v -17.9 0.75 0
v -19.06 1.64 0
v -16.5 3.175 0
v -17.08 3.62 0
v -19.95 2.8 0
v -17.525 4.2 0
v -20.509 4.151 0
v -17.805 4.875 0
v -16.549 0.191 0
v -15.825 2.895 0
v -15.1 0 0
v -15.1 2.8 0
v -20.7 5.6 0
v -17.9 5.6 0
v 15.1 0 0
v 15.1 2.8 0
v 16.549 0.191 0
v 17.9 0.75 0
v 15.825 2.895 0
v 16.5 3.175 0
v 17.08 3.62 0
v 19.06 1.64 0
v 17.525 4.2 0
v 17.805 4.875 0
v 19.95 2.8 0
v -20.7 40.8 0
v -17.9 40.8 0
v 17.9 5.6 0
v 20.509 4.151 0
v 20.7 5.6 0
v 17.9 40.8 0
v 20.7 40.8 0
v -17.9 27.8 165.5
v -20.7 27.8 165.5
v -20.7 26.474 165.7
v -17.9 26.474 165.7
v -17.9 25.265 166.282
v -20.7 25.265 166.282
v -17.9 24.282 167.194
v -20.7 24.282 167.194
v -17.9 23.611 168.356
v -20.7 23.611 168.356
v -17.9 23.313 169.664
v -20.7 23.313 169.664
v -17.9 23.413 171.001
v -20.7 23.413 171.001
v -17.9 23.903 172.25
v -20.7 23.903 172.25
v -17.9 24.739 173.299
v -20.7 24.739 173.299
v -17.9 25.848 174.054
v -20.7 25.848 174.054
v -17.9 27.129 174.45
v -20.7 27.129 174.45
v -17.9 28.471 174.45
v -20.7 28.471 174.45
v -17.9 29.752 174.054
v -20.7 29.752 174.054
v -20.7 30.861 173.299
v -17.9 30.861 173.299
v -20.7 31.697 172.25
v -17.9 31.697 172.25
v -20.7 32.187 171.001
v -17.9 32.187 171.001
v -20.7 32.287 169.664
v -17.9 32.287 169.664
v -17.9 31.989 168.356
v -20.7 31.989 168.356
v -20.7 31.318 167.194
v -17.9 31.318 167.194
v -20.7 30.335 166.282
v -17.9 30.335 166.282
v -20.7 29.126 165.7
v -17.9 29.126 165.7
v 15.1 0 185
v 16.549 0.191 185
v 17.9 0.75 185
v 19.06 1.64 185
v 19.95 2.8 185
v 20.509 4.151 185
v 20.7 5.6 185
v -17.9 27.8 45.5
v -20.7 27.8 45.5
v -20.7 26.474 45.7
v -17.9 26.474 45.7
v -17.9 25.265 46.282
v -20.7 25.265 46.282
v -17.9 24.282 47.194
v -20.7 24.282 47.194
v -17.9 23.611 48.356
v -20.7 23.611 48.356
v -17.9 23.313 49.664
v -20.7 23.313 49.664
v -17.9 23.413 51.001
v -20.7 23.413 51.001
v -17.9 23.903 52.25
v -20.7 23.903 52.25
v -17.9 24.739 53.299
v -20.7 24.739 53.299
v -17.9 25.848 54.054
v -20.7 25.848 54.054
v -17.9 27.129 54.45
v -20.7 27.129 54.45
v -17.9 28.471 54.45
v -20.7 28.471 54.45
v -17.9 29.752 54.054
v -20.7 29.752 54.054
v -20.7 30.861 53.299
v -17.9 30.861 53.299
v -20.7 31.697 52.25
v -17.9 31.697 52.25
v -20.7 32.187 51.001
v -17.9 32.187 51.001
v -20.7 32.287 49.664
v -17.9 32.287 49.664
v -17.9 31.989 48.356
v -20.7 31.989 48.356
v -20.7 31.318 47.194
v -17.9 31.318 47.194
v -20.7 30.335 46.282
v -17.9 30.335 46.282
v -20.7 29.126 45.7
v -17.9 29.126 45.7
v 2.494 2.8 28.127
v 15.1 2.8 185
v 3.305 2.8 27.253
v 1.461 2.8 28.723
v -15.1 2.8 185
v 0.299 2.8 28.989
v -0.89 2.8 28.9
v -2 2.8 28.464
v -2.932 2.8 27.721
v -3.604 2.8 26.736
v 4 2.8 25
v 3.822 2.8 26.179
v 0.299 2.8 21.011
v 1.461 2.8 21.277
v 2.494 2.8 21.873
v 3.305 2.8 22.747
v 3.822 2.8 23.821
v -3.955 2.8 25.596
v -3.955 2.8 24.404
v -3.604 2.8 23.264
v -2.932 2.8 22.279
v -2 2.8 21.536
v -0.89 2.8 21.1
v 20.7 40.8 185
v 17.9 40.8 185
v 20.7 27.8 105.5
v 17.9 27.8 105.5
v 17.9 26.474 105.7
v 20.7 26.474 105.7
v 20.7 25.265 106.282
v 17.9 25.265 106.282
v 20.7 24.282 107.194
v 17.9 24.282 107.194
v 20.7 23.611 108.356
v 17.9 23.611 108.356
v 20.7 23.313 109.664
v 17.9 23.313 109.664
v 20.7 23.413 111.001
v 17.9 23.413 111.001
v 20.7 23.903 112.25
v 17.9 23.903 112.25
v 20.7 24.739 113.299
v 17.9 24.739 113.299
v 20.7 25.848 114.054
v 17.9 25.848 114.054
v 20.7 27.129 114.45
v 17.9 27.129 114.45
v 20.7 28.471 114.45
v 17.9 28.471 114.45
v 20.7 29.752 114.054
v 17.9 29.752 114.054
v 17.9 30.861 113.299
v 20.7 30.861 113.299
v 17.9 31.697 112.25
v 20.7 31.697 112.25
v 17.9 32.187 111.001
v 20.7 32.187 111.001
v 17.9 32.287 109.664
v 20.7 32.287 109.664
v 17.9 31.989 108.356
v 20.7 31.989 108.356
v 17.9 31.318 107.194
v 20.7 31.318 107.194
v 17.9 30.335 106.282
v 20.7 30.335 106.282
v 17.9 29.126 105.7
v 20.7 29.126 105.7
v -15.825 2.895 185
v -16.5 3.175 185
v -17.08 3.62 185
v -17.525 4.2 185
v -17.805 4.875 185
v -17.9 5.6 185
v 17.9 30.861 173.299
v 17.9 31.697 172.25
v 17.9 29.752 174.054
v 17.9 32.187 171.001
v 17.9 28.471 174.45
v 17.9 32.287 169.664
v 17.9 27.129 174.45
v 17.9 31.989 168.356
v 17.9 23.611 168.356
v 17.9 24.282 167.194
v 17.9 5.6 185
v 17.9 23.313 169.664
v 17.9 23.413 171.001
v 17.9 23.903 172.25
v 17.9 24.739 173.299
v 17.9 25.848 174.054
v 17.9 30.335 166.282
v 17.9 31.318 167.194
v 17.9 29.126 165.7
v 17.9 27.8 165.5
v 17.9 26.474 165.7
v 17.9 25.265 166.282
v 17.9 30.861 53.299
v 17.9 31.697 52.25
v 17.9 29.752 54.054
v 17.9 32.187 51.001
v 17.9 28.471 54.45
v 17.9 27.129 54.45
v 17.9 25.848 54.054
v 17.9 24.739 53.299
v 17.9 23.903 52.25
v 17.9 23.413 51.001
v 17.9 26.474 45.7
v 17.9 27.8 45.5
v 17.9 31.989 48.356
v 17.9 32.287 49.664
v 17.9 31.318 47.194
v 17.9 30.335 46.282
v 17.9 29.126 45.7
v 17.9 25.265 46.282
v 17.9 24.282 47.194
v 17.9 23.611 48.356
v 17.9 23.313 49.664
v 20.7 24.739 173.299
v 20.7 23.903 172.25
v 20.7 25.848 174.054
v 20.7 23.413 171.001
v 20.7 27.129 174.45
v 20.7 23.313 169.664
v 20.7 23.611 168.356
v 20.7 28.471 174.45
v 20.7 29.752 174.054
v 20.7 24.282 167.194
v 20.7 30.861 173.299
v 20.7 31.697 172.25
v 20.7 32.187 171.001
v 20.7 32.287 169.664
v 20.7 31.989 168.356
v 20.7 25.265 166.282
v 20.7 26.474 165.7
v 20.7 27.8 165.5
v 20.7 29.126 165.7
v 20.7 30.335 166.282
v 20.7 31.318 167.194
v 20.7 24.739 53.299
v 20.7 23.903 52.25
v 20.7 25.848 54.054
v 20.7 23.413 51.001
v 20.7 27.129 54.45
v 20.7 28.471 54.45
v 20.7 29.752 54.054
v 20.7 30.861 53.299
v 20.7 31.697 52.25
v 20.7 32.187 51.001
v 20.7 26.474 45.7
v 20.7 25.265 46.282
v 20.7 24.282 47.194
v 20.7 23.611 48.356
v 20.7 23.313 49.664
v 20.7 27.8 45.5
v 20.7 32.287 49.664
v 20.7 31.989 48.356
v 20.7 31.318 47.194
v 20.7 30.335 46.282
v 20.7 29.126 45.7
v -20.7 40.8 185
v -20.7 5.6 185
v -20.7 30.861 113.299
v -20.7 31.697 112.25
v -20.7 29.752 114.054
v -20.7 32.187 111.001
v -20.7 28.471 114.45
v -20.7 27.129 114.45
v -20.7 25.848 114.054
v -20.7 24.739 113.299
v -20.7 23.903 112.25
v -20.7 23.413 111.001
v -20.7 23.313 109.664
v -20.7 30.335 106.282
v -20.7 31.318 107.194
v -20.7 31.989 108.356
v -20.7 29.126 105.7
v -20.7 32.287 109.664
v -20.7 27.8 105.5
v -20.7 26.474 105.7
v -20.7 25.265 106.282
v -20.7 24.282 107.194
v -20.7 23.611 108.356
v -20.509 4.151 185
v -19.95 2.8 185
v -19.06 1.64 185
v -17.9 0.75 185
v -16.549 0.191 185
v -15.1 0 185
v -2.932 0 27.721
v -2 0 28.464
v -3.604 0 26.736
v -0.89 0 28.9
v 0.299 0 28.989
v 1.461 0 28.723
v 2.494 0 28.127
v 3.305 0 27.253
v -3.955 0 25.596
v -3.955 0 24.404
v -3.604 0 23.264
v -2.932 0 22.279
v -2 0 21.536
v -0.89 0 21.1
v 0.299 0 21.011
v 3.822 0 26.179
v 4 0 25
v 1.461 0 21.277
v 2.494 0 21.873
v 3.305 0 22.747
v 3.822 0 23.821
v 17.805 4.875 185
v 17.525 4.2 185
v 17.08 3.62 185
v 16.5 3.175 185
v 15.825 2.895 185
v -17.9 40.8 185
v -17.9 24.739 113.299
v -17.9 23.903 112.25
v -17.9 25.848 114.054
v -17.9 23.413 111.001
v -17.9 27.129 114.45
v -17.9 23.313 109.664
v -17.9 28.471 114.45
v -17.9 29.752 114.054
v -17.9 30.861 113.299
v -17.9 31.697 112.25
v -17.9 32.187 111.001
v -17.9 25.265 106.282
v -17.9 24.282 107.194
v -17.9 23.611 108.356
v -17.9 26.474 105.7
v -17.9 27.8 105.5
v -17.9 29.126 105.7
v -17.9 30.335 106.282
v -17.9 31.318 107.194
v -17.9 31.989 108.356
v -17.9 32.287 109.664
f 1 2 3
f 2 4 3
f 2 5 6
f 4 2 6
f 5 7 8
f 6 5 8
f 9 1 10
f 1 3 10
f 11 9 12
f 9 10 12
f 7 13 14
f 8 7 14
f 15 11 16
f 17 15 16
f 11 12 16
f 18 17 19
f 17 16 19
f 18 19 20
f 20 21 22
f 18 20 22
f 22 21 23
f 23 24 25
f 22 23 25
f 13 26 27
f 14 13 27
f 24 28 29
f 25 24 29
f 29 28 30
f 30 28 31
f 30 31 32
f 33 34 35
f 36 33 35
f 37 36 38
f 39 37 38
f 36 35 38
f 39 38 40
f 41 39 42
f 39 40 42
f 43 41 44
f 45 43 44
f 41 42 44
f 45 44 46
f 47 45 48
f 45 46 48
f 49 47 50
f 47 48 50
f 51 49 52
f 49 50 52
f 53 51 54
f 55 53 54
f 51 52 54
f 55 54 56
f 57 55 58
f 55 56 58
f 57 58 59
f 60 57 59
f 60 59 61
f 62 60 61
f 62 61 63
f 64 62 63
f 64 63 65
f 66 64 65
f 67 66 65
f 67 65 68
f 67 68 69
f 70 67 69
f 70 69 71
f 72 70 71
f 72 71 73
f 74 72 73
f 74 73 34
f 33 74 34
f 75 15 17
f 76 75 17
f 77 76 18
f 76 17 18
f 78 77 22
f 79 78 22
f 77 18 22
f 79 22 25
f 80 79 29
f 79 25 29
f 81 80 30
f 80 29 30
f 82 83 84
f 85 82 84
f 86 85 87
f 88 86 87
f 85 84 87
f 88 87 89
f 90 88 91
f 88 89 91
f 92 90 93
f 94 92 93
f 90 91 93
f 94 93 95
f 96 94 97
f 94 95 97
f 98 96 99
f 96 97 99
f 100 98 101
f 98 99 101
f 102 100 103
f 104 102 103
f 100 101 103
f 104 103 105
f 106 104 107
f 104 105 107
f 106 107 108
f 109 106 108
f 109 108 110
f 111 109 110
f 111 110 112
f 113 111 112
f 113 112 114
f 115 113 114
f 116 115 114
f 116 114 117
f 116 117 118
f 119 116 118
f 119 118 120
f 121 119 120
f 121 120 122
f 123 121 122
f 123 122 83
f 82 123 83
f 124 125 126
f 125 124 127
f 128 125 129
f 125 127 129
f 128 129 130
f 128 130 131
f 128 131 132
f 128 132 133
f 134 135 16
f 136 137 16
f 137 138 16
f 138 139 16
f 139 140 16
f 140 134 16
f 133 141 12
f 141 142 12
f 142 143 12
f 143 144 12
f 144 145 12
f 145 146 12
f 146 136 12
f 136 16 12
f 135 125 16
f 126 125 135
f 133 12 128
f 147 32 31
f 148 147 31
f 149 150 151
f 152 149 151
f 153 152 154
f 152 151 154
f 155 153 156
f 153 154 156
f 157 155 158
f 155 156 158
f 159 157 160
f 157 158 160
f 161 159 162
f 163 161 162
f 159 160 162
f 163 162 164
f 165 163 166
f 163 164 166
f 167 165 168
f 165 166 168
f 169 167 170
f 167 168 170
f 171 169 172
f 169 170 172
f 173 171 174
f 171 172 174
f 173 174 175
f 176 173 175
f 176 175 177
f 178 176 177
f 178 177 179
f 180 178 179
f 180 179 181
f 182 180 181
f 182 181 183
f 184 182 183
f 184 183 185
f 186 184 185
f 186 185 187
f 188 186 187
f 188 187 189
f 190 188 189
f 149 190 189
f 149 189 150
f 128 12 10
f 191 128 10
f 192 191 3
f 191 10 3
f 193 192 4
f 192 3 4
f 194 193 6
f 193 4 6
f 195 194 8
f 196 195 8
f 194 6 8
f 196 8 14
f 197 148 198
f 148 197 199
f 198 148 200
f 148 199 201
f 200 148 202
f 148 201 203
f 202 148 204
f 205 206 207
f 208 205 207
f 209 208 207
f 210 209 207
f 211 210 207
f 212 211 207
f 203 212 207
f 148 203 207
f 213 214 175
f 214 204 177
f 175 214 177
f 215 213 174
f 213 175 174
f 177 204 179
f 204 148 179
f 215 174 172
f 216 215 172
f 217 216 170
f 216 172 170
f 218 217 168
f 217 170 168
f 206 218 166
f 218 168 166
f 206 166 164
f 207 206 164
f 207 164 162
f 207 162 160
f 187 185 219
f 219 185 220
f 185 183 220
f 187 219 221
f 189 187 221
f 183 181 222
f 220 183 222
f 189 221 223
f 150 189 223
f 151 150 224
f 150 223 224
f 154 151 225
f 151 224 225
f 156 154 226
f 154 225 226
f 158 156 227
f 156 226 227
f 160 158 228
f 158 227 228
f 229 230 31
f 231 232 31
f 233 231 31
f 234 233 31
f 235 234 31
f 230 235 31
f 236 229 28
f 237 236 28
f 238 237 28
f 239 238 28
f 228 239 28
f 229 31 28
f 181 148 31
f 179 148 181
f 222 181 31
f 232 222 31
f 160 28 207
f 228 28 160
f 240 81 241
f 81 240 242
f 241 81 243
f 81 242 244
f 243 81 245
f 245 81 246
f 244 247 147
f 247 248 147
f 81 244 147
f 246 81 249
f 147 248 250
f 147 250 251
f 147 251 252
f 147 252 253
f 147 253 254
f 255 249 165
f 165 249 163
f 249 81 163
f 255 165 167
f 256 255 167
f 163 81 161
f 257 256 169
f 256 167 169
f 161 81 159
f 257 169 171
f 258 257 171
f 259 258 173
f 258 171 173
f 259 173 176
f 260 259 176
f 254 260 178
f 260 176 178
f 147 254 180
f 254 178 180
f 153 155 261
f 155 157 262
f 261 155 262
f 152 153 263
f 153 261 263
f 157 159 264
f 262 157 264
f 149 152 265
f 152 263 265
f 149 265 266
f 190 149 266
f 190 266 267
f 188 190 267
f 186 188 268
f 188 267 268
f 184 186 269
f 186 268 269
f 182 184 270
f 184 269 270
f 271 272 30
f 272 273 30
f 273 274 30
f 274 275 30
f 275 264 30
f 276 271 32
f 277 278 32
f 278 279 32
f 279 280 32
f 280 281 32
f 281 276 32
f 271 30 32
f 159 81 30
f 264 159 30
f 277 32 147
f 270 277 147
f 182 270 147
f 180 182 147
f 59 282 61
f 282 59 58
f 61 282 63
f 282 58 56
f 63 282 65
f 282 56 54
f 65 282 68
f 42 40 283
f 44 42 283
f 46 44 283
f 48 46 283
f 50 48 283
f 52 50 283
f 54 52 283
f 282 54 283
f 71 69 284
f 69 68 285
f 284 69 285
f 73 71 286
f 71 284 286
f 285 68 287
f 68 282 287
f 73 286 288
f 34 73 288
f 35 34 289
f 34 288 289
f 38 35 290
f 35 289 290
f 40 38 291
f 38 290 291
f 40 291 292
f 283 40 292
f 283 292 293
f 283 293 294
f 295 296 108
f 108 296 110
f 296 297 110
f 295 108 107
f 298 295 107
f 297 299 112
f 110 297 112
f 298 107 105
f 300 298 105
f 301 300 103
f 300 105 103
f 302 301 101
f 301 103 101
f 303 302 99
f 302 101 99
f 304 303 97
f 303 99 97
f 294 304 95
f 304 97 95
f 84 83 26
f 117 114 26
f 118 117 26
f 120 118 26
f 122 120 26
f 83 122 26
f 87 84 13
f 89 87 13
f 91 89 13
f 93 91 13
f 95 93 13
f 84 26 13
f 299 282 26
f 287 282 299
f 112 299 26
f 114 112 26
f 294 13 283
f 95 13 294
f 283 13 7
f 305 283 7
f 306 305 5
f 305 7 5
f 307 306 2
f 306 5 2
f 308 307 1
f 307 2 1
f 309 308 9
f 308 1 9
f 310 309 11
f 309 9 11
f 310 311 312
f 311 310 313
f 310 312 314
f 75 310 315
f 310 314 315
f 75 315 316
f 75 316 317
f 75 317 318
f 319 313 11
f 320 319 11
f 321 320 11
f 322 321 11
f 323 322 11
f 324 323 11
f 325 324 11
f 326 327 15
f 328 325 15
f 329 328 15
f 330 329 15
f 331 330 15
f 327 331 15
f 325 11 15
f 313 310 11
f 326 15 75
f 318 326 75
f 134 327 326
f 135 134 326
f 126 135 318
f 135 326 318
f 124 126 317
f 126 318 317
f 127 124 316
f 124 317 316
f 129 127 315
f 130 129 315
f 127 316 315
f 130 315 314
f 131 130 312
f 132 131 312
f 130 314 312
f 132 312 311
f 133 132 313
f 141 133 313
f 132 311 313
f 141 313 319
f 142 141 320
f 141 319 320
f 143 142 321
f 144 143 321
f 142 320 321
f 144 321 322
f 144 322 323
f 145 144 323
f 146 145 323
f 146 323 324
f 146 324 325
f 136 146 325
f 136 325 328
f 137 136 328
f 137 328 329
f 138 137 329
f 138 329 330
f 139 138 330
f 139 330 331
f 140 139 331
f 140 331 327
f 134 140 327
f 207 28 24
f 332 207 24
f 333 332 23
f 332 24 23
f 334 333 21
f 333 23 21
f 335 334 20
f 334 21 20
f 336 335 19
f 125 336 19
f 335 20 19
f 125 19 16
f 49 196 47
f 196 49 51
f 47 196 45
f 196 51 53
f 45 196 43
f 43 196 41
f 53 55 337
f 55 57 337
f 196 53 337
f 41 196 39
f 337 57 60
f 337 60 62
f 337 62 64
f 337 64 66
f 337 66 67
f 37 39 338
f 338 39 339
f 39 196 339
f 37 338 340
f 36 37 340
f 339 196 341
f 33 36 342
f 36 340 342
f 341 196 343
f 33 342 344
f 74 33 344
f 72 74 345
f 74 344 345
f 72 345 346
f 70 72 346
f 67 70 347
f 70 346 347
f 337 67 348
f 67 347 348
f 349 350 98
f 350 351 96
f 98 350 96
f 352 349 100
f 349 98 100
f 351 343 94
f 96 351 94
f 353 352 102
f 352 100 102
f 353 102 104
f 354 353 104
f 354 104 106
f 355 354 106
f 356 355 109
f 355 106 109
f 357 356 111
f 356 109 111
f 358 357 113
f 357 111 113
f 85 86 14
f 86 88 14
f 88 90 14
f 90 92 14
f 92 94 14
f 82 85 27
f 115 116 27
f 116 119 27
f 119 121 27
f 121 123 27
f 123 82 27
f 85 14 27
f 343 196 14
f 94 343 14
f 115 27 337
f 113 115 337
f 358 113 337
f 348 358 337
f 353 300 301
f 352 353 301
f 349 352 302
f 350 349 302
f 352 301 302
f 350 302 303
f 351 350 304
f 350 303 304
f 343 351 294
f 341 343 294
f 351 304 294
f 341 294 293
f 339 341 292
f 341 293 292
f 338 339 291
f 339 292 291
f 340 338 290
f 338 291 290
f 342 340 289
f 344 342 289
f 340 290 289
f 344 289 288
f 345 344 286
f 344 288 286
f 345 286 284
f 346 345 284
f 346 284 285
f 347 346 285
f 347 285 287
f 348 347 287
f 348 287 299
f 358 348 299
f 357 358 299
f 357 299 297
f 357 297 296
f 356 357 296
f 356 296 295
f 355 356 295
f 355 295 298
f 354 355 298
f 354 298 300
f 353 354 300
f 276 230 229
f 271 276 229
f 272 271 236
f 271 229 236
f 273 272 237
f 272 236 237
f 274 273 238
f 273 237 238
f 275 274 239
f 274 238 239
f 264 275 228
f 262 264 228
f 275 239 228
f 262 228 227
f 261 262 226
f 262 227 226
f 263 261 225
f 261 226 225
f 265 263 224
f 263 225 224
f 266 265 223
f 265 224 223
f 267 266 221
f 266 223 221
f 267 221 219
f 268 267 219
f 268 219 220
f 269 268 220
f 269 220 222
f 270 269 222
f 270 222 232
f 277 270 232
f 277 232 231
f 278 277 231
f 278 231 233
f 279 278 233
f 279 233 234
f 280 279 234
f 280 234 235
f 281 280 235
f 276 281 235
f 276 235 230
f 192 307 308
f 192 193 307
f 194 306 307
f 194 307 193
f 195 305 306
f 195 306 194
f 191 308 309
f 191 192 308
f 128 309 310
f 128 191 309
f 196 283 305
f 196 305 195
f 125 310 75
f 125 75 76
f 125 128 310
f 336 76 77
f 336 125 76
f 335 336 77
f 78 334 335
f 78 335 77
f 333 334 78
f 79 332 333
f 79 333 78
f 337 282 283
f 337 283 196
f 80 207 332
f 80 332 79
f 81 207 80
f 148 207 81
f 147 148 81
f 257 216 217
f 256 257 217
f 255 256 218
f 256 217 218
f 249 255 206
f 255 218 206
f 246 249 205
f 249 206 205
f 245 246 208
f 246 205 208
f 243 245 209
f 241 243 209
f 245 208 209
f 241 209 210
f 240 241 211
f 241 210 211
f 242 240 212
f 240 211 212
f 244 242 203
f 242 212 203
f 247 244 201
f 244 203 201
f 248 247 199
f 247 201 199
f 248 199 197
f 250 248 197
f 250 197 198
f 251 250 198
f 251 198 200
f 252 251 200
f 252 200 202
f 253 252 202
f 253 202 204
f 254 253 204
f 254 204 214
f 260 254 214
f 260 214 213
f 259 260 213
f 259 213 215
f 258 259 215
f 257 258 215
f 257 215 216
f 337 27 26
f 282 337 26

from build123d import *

# Parameters (mm, degrees)
BASE_FLANGE1_DEPTH = 185
CUT_EXTRUDE1_REACH = 192.573
SKETCH11_R         = 4
CUT_EXTRUDE2_REACH = 195.916
SKETCH13_R         = 4.5


# Sheet-metal steps are written as plain solids
with BuildPart() as part:
    # Sketch1 → Base-Flange1 (new body)
    with BuildSketch(Plane.XY):
        with BuildLine():
            Line((-20.7, 40.8), (-20.7, 5.6))
            ThreePointArc((-20.7, 5.6), (-19.059797975, 1.640202025), (-15.1, 0))
            Line((-15.1, 0), (15.1, 0))
            ThreePointArc((15.1, 0), (19.059797975, 1.640202025), (20.7, 5.6))
            Line((20.7, 5.6), (20.7, 40.8))
            Line((20.7, 40.8), (17.9, 40.8))
            Line((17.9, 40.8), (17.9, 5.6))
            ThreePointArc((17.9, 5.6), (17.079898987, 3.620101013), (15.1, 2.8))
            Line((15.1, 2.8), (-15.1, 2.8))
            ThreePointArc((-15.1, 2.8), (-17.079898987, 3.620101013), (-17.9, 5.6))
            Line((-17.9, 5.6), (-17.9, 40.8))
            Line((-17.9, 40.8), (-20.7, 40.8))
        make_face()
    extrude(amount=BASE_FLANGE1_DEPTH)

    # Sketch11 → Cut-Extrude1 (cut, up to next)
    with BuildSketch(Plane.XZ, mode=Mode.PRIVATE) as cut_extrude1_sk1:
        with Locations((0, 25)):
            Circle(SKETCH11_R)
    cut_extrude1_tool1 = extrude(cut_extrude1_sk1.sketch, amount=-CUT_EXTRUDE1_REACH, mode=Mode.PRIVATE) & part.part
    add(cut_extrude1_tool1.solids().sort_by_distance((0, 0, 25))[0], mode=Mode.SUBTRACT)

    # Cut-Extrude2: up to this face of the body (flat: up to its plane)
    cut_extrude2_end = Plane(part.part.faces().sort_by_distance((20.7, 23.2, 92.5))[0])
    # Sketch13 → Cut-Extrude2 (cut, up to the picked face)
    with BuildSketch(Plane.ZY.offset(20.7), mode=Mode.PRIVATE) as cut_extrude2_sk1:
        with Locations(Location((50, 27.8, 0), (0, 0, 180))):
            Circle(SKETCH13_R)
    cut_extrude2_tool1 = split(extrude(cut_extrude2_sk1.sketch, amount=-CUT_EXTRUDE2_REACH, mode=Mode.PRIVATE), bisect_by=cut_extrude2_end, keep=Keep.BOTH, mode=Mode.PRIVATE)
    # Sketch13 → Cut-Extrude2 (cut, up to the picked face)
    with BuildSketch(Plane.ZY.offset(20.7), mode=Mode.PRIVATE) as cut_extrude2_sk2:
        with Locations(Location((110, 27.8, 0), (0, 0, 180))):
            Circle(SKETCH13_R)
    cut_extrude2_tool2 = split(extrude(cut_extrude2_sk2.sketch, amount=-CUT_EXTRUDE2_REACH, mode=Mode.PRIVATE), bisect_by=cut_extrude2_end, keep=Keep.BOTH, mode=Mode.PRIVATE)
    # Sketch13 → Cut-Extrude2 (cut, up to the picked face)
    with BuildSketch(Plane.ZY.offset(20.7), mode=Mode.PRIVATE) as cut_extrude2_sk3:
        with Locations(Location((170, 27.8, 0), (0, 0, 180))):
            Circle(SKETCH13_R)
    cut_extrude2_tool3 = split(extrude(cut_extrude2_sk3.sketch, amount=-CUT_EXTRUDE2_REACH, mode=Mode.PRIVATE), bisect_by=cut_extrude2_end, keep=Keep.BOTH, mode=Mode.PRIVATE)
    add(cut_extrude2_tool1.solids().sort_by(Axis((-20.7, 27.8, 50), (1, 0, 0)))[0], mode=Mode.SUBTRACT)
    add(cut_extrude2_tool2.solids().sort_by(Axis((-20.7, 27.8, 110), (1, 0, 0)))[0], mode=Mode.SUBTRACT)
    add(cut_extrude2_tool3.solids().sort_by(Axis((-20.7, 27.8, 170), (1, 0, 0)))[0], mode=Mode.SUBTRACT)


solid = part.part
